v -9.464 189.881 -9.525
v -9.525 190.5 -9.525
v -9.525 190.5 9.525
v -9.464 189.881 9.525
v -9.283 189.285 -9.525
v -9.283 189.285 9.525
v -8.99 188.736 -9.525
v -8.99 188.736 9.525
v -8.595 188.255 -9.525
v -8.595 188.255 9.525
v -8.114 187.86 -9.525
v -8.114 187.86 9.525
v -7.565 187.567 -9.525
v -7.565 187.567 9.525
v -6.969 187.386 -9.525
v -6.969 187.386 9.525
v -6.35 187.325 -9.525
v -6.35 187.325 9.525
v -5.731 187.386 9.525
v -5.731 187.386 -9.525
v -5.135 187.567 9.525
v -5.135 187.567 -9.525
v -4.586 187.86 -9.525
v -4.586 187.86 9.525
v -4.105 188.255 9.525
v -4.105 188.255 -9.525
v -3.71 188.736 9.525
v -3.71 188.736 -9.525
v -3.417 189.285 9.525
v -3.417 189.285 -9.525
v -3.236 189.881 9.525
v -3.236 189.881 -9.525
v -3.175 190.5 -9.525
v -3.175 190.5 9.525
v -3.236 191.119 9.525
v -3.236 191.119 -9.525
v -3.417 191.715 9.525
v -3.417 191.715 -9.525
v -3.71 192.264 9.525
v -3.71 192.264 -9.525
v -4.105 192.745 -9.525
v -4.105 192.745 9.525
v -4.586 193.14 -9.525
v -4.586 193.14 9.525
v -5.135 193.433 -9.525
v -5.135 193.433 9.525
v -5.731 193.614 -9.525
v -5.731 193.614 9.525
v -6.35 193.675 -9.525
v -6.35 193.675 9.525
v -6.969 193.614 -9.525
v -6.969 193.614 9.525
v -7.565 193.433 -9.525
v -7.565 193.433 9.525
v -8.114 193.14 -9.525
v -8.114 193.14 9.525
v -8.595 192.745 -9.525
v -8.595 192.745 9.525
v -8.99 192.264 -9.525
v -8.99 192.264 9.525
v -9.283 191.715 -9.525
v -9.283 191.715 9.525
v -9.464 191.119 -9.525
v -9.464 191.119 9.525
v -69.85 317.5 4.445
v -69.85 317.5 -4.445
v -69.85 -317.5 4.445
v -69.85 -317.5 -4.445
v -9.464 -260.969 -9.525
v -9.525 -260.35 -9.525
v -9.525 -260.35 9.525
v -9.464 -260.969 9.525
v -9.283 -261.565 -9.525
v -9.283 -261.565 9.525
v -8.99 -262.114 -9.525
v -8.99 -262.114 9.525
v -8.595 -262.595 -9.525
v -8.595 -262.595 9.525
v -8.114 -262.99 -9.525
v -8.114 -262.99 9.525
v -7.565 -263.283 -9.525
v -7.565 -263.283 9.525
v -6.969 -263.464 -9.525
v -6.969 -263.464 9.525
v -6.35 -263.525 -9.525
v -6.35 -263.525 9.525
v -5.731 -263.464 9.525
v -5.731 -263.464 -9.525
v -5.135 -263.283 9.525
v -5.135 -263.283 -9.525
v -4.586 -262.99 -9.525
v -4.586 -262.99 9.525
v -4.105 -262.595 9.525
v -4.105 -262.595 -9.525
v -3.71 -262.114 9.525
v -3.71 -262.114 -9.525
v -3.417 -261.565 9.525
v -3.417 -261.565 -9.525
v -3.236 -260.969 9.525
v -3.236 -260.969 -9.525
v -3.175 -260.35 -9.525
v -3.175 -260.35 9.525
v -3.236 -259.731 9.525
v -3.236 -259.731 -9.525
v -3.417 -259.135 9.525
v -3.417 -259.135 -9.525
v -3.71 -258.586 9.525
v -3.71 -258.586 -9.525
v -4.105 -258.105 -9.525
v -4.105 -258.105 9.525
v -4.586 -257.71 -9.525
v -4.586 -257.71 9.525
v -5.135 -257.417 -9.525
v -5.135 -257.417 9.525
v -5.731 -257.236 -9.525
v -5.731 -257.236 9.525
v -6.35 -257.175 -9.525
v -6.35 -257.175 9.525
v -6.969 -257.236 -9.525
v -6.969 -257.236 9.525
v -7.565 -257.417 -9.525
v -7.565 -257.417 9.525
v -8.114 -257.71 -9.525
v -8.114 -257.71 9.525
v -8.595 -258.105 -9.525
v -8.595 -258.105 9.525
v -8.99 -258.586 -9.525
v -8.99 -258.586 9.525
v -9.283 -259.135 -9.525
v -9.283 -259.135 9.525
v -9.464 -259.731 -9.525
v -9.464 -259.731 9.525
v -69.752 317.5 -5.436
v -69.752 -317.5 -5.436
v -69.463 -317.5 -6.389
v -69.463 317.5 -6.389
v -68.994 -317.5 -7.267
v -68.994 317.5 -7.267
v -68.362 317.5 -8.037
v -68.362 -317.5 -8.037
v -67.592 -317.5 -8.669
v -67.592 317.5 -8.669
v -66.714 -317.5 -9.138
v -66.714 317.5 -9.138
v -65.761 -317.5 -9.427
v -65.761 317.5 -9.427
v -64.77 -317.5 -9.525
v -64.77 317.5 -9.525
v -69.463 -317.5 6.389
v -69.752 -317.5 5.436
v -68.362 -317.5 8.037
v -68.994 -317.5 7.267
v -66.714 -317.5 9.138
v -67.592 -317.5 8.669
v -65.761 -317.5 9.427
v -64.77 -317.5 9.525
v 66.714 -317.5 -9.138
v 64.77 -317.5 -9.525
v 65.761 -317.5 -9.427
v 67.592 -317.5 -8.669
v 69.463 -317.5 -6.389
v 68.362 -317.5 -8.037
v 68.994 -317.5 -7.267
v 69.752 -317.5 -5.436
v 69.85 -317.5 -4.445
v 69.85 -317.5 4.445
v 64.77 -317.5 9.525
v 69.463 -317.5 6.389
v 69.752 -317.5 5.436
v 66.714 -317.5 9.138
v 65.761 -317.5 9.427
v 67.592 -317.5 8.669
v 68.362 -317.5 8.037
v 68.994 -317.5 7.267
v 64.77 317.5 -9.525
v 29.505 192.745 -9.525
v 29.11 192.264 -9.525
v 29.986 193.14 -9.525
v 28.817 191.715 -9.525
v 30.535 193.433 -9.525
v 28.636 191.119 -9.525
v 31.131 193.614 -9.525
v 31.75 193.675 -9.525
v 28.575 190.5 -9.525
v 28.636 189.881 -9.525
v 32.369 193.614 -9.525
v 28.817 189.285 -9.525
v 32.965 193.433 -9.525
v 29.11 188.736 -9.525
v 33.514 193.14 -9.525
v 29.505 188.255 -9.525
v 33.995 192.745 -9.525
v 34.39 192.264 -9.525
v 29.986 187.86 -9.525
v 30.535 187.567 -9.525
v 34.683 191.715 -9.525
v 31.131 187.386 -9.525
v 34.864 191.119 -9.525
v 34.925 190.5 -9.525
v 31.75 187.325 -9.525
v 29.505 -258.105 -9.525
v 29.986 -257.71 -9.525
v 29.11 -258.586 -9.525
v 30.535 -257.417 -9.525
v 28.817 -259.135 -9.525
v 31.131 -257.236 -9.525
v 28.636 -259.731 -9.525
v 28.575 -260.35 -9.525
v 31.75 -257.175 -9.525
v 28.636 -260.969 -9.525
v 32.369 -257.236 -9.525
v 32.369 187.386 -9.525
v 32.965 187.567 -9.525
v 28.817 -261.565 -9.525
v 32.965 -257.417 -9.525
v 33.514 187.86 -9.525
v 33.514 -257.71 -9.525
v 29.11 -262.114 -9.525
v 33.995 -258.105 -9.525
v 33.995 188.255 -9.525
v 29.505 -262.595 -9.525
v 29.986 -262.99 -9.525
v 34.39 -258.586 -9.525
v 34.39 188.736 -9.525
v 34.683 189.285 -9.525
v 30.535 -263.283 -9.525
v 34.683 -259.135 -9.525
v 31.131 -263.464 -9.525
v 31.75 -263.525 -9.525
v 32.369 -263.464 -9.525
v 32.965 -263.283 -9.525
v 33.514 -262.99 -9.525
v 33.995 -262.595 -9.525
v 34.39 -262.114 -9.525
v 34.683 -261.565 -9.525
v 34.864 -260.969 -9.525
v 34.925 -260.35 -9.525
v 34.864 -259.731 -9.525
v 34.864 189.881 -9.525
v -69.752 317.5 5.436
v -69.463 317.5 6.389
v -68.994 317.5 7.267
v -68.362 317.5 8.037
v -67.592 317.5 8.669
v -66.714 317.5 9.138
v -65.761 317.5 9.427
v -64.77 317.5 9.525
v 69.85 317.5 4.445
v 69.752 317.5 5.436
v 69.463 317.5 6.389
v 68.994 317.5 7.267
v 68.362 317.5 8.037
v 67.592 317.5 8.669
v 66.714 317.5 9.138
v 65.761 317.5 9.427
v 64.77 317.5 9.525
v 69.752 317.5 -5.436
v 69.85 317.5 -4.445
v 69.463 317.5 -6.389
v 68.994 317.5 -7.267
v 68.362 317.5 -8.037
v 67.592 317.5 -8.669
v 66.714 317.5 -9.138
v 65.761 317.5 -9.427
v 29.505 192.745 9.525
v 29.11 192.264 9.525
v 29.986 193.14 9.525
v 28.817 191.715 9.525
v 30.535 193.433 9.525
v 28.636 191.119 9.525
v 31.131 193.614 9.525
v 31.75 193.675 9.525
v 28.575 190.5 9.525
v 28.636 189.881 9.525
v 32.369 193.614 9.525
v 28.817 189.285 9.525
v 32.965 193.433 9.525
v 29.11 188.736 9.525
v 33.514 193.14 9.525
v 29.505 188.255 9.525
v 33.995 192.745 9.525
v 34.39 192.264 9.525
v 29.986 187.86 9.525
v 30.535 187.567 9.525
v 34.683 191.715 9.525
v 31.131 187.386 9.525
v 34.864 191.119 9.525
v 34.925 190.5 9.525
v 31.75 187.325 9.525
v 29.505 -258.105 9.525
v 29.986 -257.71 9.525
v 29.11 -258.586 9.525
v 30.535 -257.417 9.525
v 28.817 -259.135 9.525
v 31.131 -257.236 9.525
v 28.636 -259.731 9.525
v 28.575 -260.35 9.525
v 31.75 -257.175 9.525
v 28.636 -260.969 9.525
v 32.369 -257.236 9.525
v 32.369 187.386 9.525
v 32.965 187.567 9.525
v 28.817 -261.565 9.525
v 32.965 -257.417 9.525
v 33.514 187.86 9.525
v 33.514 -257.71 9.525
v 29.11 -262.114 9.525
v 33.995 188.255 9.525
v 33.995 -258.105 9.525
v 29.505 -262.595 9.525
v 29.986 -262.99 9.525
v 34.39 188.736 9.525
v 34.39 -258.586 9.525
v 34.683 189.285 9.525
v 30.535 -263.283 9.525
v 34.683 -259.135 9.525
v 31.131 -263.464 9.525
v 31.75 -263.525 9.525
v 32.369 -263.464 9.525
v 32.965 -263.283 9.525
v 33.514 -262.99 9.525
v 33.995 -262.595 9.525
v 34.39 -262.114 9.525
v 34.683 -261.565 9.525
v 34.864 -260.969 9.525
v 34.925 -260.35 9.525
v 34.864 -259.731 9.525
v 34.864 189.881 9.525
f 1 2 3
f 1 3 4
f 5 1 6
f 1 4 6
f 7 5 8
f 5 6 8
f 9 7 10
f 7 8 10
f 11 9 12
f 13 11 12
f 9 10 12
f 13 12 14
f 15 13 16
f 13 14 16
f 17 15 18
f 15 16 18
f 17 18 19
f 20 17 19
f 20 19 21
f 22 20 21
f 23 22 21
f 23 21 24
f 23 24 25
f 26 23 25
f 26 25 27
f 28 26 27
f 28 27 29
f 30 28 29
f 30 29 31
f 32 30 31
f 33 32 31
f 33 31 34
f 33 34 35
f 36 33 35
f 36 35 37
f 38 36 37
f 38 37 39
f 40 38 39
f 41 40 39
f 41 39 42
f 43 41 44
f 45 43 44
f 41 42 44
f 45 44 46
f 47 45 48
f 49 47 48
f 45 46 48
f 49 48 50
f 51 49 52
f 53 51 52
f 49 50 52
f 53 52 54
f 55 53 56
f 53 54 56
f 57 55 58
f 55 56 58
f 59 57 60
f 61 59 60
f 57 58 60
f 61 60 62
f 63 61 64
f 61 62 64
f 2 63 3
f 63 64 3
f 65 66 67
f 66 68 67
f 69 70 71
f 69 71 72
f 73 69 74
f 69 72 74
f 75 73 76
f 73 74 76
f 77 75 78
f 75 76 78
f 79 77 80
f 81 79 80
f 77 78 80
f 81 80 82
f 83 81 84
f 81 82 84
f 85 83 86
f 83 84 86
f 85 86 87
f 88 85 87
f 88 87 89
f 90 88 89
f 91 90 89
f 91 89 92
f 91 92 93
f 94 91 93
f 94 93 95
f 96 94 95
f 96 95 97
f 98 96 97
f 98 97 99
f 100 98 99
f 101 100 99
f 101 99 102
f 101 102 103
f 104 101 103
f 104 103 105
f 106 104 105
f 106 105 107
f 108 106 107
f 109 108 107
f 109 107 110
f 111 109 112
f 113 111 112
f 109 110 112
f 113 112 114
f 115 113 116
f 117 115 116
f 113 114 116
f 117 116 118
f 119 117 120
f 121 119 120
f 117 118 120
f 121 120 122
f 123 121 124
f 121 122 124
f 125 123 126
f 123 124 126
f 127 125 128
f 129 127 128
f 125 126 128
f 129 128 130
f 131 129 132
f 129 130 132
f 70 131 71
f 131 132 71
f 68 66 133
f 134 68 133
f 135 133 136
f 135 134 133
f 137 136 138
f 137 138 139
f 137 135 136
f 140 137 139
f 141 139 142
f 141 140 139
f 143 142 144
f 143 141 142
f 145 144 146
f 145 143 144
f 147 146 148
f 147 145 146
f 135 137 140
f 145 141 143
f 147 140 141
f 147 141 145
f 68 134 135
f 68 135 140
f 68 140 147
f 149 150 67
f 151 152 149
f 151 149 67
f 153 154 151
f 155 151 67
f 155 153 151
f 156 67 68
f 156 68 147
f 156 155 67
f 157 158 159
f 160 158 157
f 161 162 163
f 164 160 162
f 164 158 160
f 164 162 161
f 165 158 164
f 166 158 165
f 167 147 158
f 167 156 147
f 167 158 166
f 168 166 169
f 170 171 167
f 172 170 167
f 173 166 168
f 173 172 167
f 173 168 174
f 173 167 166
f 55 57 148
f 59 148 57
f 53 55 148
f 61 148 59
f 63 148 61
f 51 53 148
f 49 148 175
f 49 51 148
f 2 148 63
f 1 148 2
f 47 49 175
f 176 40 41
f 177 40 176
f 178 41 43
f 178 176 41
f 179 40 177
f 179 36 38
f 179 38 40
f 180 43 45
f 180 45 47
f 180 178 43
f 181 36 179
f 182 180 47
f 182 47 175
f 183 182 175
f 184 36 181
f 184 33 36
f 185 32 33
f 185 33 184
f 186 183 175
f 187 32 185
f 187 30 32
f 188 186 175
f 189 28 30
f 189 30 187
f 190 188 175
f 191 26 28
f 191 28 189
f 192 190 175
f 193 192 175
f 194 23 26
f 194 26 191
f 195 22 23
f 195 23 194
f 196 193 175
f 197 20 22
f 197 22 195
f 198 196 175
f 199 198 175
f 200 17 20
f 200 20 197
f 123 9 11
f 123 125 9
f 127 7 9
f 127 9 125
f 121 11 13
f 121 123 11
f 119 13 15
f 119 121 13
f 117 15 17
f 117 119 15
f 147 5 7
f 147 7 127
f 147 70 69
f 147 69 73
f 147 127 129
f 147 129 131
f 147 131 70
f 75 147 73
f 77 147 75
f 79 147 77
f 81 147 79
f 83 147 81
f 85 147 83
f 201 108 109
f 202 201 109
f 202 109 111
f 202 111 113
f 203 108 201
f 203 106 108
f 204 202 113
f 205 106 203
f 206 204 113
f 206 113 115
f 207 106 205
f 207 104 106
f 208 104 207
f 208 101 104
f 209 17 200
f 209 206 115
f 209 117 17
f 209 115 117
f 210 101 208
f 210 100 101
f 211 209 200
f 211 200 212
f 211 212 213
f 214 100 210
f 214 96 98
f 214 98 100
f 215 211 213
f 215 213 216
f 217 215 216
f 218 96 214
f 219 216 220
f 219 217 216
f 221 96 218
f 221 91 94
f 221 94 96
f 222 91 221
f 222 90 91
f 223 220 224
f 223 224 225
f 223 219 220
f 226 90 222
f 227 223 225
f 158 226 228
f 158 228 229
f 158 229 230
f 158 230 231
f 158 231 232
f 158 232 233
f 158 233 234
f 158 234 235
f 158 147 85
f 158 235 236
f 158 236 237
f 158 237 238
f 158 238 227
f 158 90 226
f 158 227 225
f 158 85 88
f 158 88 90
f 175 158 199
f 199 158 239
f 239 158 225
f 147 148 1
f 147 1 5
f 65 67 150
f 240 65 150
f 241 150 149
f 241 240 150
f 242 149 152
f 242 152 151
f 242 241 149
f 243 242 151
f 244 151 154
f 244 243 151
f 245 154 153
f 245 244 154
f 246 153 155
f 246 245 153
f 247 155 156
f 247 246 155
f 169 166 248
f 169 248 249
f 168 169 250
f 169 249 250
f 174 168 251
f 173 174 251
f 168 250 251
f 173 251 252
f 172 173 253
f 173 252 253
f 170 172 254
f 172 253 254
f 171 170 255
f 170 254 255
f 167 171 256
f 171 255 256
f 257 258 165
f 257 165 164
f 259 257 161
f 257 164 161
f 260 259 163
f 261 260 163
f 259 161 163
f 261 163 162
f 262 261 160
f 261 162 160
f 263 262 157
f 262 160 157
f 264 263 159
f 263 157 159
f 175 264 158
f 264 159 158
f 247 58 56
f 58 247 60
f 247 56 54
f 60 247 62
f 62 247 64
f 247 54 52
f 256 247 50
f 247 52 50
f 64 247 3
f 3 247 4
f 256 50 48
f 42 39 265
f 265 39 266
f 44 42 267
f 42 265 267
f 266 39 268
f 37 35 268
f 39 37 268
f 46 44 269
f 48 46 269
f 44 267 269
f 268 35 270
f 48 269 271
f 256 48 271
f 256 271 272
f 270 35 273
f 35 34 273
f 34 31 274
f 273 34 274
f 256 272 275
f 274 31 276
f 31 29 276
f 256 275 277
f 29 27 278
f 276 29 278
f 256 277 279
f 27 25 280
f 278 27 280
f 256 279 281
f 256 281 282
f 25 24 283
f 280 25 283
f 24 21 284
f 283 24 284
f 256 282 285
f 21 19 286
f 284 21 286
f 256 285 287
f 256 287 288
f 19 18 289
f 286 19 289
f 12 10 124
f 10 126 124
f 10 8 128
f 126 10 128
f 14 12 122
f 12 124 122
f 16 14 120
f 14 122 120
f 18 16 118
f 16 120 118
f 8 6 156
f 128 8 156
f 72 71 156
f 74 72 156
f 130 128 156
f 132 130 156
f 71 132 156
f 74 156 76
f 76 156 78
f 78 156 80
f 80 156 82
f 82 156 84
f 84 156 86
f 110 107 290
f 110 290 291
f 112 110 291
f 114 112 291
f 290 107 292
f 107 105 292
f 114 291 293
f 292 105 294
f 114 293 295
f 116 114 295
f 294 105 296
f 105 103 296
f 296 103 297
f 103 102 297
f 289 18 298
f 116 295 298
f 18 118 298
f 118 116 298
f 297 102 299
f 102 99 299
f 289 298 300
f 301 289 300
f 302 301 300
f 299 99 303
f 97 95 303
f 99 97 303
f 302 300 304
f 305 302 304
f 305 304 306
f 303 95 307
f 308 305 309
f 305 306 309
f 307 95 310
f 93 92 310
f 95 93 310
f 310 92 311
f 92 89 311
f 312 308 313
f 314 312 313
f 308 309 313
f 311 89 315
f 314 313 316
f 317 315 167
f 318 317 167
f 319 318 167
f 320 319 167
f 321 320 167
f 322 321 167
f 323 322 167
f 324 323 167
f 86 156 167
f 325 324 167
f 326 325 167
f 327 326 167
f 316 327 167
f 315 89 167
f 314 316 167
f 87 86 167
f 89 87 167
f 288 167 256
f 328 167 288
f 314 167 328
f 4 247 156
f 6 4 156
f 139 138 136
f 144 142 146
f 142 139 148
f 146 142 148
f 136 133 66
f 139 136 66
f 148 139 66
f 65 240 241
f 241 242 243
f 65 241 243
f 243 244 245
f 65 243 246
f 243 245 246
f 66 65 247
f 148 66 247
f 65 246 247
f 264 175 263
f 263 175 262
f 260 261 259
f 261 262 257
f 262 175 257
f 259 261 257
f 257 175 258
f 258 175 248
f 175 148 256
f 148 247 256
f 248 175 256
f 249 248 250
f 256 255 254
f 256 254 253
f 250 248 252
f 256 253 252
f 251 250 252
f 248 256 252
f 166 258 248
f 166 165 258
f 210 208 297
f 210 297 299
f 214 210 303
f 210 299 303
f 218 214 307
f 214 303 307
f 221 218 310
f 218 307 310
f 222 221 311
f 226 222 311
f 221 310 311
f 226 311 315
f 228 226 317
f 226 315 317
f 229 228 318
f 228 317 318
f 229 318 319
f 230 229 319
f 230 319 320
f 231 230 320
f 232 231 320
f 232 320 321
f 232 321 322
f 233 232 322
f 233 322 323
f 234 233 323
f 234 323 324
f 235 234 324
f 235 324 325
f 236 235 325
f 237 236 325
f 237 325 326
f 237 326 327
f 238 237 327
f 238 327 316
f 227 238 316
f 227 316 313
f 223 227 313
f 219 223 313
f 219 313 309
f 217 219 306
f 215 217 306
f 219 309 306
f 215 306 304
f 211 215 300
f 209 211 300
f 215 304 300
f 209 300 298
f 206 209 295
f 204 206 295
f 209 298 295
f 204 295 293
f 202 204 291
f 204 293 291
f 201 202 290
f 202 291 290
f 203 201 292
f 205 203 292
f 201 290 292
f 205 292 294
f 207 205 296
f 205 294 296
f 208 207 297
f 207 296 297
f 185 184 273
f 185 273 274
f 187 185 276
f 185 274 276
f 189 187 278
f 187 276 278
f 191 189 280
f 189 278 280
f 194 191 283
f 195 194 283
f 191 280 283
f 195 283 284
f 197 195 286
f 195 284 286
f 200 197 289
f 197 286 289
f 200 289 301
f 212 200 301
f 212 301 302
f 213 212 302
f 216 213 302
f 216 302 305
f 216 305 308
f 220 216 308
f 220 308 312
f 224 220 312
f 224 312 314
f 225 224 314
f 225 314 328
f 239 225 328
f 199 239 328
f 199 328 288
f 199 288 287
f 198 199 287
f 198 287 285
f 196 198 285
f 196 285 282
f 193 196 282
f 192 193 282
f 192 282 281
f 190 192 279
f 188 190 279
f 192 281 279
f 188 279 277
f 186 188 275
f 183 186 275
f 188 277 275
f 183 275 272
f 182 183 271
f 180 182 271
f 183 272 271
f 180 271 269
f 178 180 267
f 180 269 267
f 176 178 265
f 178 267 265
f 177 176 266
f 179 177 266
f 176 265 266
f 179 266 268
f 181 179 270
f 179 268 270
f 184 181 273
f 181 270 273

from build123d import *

# Parameters (mm, degrees)
F0_W     = 139.7
F0_H     = 19.05
F1_DEPTH = 317.5
F2_R     = 5.08
F4_D     = 6.35
F4_DEPTH = 25.4


with BuildPart() as f1:
    # F0 (on Front) → F1 (new body, symmetric)
    with BuildSketch(Plane.XZ):
        Rectangle(F0_W, F0_H)
    extrude(amount=F1_DEPTH, both=True)

    # F2
    f2_edges = [f1.edges().sort_by_distance(p)[0] for p in [
        (-69.85, 0, 9.525),
        (69.85, 0, 9.525),
        (69.85, 0, -9.525),
        (-69.85, 0, -9.525),
    ]]
    fillet(f2_edges, radius=F2_R)

    # F4
    with Locations(Plane(origin=(0, 0, -9.525), x_dir=(1, 0, 0), z_dir=(0, 0, -1))):
        with Locations((-6.35, 260.35), (31.75, 260.35), (31.75, -190.5), (-6.35, -190.5)):
            Hole(F4_D / 2, depth=F4_DEPTH)


solid = f1.part
